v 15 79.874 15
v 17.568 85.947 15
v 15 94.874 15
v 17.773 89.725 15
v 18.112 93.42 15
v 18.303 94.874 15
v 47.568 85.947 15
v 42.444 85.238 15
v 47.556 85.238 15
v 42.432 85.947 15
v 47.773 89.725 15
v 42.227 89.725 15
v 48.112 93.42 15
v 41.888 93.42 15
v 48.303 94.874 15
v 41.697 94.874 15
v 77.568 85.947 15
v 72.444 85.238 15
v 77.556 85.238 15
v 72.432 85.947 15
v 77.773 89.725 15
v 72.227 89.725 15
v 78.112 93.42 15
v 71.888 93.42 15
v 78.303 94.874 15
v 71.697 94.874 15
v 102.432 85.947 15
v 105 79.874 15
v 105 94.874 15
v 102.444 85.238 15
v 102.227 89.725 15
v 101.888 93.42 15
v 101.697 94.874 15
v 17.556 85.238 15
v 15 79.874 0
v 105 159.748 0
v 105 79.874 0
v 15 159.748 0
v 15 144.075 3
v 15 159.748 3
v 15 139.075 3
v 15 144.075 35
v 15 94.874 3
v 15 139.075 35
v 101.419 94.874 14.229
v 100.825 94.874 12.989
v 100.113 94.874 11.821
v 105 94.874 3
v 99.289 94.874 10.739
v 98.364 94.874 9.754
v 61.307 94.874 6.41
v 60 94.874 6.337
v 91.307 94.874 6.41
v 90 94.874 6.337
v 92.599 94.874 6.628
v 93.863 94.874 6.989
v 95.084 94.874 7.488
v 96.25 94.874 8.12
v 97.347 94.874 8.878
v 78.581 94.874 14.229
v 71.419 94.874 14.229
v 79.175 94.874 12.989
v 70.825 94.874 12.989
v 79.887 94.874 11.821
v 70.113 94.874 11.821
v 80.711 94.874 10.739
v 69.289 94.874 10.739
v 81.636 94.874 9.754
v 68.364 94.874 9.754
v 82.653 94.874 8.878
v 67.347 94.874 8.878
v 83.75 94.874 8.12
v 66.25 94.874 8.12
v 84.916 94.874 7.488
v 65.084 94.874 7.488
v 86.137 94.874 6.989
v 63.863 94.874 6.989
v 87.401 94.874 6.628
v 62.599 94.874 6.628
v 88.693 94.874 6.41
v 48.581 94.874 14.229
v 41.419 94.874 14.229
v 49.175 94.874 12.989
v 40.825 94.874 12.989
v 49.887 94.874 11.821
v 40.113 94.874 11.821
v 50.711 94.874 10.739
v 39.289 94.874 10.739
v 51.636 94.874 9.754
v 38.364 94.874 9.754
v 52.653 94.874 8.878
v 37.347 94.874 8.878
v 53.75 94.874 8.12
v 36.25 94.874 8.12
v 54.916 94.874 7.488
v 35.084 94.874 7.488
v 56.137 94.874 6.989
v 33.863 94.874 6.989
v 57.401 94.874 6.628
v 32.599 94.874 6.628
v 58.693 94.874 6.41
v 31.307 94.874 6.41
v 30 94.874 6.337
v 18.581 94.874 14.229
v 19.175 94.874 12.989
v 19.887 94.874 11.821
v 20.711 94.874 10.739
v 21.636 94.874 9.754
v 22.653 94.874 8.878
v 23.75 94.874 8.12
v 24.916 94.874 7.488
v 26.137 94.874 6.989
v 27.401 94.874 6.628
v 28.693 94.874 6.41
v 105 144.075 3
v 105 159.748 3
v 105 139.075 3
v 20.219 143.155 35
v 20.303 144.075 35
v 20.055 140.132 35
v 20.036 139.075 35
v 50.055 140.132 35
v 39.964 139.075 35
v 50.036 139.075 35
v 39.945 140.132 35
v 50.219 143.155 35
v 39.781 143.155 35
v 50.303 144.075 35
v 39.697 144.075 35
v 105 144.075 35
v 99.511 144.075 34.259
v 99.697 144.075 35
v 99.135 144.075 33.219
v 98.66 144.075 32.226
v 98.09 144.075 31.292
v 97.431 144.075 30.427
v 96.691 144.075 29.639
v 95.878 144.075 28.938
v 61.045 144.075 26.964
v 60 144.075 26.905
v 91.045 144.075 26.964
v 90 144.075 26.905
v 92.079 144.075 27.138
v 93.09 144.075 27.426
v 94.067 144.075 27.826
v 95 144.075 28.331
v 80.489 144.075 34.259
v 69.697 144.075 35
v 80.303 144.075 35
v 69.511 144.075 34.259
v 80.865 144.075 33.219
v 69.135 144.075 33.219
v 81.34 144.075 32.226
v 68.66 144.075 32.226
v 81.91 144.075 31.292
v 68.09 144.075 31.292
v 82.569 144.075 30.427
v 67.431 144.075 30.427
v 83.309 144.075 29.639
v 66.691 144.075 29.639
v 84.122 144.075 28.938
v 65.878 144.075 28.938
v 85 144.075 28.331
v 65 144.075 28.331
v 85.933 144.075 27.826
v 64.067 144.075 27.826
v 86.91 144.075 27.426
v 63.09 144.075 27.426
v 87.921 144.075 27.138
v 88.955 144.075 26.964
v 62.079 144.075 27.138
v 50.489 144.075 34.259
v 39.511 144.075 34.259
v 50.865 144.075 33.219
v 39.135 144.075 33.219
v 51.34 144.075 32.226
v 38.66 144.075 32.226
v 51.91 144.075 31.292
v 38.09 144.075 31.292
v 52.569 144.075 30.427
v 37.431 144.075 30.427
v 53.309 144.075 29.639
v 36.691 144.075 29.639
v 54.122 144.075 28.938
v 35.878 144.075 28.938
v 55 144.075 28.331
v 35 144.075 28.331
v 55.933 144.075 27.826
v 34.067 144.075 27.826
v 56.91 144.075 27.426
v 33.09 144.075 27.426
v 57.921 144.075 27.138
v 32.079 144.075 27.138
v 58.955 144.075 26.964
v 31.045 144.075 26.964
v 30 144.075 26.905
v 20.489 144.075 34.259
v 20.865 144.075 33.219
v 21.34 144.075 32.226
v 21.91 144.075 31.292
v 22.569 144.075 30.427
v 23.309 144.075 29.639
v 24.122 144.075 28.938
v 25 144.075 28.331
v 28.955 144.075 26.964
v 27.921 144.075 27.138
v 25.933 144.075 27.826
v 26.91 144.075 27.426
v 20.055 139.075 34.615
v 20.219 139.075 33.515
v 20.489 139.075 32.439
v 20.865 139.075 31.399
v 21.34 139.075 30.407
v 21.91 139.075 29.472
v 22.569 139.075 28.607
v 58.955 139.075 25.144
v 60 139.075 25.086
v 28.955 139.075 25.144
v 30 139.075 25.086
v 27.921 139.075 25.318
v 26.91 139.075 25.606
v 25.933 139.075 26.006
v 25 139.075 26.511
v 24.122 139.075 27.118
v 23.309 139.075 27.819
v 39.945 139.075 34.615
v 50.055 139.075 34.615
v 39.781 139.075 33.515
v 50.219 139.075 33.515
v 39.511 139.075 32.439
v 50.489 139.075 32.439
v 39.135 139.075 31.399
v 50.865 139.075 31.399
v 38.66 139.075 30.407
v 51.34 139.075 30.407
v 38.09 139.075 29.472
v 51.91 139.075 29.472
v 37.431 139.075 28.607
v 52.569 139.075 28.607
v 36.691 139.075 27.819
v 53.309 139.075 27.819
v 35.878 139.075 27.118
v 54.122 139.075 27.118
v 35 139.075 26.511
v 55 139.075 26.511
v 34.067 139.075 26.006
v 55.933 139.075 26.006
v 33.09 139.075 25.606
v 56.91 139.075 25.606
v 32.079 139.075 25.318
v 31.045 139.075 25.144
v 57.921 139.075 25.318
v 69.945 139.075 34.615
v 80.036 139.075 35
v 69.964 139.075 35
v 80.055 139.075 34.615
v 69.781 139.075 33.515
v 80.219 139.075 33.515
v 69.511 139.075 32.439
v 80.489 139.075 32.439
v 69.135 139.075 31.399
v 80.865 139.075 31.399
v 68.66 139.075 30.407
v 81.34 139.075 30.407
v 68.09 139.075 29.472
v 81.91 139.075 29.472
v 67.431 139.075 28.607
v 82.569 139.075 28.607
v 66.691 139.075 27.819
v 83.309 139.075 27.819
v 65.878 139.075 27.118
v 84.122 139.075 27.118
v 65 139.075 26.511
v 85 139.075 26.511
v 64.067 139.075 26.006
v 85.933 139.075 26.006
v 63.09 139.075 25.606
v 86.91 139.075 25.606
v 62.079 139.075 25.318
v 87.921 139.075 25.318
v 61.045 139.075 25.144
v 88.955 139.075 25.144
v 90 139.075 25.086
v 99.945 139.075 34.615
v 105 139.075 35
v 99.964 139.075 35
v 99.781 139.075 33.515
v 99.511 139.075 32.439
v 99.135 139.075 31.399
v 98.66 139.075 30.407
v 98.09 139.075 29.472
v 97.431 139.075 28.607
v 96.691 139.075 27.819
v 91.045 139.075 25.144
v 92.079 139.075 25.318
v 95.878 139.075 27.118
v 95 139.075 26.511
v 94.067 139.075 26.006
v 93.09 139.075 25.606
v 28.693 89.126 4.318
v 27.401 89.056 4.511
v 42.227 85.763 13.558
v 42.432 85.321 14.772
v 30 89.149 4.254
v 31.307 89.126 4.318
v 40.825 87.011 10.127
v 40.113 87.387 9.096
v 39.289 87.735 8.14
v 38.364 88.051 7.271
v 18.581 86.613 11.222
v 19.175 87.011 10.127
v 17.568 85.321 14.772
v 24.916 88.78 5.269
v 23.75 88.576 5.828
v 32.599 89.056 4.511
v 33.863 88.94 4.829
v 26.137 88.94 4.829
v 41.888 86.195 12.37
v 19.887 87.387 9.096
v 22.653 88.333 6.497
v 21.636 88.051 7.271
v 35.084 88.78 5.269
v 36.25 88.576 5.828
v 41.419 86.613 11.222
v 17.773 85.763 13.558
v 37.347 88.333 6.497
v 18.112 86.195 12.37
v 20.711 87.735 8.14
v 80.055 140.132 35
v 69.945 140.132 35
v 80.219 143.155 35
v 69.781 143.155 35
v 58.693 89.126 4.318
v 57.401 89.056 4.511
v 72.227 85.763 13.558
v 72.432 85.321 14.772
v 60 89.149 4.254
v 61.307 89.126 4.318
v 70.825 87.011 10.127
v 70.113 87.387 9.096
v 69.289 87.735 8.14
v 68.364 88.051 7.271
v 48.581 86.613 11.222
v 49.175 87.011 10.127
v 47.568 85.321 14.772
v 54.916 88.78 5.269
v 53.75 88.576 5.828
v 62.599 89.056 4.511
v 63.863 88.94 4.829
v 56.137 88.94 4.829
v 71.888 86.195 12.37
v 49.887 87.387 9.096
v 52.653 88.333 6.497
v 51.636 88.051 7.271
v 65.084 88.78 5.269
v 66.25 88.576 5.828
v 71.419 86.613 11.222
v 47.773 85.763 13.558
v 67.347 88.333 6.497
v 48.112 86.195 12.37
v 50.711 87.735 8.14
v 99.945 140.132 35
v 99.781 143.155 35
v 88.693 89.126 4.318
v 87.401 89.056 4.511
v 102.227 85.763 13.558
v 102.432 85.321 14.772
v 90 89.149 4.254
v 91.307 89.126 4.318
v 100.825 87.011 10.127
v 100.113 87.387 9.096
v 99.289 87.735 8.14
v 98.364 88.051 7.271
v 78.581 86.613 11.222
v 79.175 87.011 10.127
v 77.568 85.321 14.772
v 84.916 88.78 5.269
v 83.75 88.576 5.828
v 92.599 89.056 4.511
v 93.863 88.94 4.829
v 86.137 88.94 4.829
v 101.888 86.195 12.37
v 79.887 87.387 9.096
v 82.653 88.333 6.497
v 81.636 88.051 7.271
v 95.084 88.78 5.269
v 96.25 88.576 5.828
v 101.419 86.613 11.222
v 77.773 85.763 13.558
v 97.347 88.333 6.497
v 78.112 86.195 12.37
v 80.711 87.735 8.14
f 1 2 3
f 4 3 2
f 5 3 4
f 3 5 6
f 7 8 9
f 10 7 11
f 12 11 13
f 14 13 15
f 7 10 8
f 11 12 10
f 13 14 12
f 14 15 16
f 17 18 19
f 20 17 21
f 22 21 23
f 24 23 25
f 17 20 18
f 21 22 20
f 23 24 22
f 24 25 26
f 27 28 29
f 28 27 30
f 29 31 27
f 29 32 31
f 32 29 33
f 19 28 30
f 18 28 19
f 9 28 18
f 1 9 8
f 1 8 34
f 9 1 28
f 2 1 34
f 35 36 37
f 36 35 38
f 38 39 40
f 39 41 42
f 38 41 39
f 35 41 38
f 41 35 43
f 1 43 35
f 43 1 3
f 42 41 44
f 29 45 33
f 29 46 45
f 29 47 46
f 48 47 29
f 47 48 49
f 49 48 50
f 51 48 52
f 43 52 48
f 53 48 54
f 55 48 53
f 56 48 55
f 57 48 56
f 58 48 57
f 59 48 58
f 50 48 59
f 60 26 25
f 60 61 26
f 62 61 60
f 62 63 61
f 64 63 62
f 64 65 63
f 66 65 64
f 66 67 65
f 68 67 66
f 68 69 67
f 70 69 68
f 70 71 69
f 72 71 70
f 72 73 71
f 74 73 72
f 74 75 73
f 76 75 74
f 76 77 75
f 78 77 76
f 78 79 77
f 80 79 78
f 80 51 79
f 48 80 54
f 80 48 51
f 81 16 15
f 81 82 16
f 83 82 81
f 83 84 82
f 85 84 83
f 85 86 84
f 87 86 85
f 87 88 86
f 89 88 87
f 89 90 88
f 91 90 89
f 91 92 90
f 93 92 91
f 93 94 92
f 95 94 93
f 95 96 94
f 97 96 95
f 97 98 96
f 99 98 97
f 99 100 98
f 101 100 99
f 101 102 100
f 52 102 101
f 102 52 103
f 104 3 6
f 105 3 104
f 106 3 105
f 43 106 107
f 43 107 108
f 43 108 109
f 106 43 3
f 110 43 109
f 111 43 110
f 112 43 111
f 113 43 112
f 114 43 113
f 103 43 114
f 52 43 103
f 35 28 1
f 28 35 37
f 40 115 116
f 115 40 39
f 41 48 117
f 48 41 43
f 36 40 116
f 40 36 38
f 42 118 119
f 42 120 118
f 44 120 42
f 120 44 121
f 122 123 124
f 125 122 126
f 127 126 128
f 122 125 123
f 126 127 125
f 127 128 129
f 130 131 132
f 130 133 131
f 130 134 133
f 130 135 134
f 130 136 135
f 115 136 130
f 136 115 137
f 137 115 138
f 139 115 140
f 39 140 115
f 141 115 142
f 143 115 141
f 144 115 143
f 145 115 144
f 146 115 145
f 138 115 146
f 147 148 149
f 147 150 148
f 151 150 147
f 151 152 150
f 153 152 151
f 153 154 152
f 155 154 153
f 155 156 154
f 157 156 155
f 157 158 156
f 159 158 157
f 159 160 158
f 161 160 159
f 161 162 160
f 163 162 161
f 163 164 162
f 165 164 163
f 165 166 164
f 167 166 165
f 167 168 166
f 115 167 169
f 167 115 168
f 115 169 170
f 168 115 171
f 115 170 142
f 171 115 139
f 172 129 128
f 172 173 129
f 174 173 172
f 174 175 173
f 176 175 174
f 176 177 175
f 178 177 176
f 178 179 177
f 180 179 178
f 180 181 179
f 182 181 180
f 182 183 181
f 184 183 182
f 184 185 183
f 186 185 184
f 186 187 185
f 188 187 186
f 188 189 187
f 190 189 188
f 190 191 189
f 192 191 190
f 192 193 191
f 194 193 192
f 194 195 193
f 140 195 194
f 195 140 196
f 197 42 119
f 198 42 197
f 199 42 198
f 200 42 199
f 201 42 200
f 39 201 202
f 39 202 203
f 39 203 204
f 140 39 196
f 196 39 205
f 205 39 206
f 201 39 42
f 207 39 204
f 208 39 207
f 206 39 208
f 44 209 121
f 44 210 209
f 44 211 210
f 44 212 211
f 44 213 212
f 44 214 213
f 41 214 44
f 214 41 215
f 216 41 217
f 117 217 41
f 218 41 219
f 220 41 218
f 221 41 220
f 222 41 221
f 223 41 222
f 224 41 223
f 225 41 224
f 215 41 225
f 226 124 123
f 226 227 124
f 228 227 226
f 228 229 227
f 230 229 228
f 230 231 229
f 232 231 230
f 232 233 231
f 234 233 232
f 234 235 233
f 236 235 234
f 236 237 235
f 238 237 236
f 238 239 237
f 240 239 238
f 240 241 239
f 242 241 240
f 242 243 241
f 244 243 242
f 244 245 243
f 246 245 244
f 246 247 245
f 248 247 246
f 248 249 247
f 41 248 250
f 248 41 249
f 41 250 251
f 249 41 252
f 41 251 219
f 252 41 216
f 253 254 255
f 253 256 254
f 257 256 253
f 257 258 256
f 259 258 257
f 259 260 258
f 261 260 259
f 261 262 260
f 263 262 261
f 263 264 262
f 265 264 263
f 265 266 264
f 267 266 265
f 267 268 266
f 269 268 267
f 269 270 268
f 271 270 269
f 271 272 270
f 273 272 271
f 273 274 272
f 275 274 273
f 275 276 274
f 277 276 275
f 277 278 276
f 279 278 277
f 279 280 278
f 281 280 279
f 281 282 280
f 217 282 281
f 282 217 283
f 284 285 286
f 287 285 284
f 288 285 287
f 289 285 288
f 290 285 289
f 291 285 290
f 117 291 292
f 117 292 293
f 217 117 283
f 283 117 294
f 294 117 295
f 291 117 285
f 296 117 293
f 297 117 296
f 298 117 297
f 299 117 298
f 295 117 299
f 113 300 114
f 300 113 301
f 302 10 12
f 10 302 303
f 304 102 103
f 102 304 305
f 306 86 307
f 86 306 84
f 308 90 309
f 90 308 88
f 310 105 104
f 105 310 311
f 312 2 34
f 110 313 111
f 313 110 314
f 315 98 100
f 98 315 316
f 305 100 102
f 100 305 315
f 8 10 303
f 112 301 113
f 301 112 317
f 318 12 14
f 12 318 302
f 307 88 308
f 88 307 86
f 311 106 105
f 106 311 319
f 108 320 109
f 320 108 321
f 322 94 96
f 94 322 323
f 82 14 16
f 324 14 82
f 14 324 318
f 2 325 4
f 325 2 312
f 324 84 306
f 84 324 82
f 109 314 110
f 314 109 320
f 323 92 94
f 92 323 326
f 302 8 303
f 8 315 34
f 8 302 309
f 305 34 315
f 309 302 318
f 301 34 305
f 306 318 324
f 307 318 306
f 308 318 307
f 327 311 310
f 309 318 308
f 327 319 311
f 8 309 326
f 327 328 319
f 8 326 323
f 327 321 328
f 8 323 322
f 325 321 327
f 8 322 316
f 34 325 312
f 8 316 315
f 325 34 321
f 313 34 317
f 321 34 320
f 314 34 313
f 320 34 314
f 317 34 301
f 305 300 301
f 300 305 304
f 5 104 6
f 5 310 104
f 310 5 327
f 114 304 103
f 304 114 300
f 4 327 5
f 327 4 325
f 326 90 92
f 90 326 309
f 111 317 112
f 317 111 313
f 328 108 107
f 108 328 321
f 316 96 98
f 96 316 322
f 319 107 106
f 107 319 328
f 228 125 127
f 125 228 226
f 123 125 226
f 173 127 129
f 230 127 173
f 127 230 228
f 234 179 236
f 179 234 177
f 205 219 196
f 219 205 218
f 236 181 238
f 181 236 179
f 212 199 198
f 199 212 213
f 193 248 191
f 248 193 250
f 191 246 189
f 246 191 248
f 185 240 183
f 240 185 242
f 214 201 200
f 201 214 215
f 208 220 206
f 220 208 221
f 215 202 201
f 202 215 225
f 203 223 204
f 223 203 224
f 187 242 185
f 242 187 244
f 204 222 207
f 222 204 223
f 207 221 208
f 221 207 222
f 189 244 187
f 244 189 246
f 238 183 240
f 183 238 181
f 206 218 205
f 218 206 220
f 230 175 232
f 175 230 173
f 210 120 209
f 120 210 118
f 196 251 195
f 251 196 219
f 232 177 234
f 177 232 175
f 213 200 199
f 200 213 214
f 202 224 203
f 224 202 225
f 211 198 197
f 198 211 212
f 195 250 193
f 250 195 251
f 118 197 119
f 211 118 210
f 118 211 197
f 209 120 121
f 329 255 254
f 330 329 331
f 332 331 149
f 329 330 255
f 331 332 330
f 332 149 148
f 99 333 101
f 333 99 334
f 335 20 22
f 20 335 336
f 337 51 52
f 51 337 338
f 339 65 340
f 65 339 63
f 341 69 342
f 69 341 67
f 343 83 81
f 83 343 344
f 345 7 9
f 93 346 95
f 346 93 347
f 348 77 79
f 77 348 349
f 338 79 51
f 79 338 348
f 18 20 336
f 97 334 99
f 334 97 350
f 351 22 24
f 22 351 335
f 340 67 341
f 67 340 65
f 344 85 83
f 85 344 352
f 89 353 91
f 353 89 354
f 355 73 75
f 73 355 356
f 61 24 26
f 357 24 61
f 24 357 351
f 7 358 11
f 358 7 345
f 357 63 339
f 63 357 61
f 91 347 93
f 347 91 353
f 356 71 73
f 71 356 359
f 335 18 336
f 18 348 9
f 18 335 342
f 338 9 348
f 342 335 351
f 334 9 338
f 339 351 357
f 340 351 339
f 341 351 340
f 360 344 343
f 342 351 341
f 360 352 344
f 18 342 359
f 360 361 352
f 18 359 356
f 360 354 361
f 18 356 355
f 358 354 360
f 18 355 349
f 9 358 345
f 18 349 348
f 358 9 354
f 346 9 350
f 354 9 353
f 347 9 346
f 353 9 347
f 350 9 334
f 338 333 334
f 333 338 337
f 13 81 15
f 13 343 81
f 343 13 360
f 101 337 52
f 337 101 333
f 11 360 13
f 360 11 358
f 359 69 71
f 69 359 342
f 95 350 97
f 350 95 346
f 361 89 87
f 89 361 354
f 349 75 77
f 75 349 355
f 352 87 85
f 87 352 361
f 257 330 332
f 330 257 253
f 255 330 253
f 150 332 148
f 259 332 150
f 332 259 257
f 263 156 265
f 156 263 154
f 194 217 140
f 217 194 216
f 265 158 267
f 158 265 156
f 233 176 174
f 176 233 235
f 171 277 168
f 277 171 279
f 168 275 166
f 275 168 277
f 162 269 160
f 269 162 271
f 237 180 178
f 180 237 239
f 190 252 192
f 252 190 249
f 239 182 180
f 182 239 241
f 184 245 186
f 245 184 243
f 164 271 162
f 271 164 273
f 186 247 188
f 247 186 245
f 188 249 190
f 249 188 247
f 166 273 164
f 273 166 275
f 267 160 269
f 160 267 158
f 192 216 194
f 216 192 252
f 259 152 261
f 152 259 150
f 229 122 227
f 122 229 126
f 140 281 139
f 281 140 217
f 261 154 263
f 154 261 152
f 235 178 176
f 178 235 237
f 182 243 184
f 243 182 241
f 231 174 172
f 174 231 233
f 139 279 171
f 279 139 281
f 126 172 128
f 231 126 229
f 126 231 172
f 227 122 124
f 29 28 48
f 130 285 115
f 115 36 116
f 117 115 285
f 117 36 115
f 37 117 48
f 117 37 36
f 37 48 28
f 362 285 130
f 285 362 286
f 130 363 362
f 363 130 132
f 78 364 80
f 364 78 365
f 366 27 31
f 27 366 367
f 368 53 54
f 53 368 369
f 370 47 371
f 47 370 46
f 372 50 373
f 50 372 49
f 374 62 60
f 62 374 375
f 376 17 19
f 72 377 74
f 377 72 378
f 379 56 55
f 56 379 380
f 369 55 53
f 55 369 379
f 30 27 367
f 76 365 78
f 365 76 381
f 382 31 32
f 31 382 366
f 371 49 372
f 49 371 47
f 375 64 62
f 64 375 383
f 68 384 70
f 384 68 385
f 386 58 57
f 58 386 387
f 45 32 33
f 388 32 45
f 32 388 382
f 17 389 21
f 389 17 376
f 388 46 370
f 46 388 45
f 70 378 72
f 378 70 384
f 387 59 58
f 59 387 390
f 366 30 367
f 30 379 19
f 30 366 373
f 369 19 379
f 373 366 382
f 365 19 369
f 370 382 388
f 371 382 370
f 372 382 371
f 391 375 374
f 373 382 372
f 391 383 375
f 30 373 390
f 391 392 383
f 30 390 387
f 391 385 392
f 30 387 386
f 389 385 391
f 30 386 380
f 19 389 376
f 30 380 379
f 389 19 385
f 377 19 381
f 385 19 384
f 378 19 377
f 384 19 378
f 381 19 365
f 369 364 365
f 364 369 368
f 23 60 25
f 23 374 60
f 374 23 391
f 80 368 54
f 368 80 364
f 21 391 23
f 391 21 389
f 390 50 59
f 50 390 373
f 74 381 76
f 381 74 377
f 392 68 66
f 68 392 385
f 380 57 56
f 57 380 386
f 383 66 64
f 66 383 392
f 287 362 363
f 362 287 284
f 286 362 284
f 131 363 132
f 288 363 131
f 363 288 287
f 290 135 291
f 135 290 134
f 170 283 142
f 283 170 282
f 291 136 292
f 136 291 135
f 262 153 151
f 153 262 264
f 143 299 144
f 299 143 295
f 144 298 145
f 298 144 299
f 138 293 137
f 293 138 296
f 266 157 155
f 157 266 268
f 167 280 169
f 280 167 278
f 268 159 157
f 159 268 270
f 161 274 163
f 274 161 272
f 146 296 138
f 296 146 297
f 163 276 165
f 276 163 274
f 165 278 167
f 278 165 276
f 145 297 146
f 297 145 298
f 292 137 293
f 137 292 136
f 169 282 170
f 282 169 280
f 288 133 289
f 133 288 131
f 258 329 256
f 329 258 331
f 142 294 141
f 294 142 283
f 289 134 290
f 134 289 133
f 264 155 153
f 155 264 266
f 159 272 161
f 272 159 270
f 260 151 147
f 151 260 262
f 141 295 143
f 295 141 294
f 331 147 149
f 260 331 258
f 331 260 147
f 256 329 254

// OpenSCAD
// preview[view:south, tilt:top]

// Number of holders in the X direction
holders_x = 3; // [1:100]
// Number of holders in the Y direction
holders_y = 1; // [1:100]

module paintmock(d=25, h=50, neck_d=20, neck_h=28) {
    cylinder(d=d, h=h, $fn=60);
    translate([0,0,neck_h]) cylinder(d=neck_d, h=50, $fn=60);
}

module rack(x, y = 1) { 
    for (j = [1:y])
    for (i = [1:x])
    translate([30*i,sin(70)*85*j,0])
    difference() {
        translate([-15,0,0])
        {
            cube([30, 15, 15]);
            cube([30, sin(70)*85, 3]);
            translate([0,sin(70)*63, 0])
                cube([30, 5, 35]);
        }
        translate([0,5,16])
            rotate([-70,0,0]) {
                paintmock();
            }
    }
}


rack(holders_x, holders_y);
